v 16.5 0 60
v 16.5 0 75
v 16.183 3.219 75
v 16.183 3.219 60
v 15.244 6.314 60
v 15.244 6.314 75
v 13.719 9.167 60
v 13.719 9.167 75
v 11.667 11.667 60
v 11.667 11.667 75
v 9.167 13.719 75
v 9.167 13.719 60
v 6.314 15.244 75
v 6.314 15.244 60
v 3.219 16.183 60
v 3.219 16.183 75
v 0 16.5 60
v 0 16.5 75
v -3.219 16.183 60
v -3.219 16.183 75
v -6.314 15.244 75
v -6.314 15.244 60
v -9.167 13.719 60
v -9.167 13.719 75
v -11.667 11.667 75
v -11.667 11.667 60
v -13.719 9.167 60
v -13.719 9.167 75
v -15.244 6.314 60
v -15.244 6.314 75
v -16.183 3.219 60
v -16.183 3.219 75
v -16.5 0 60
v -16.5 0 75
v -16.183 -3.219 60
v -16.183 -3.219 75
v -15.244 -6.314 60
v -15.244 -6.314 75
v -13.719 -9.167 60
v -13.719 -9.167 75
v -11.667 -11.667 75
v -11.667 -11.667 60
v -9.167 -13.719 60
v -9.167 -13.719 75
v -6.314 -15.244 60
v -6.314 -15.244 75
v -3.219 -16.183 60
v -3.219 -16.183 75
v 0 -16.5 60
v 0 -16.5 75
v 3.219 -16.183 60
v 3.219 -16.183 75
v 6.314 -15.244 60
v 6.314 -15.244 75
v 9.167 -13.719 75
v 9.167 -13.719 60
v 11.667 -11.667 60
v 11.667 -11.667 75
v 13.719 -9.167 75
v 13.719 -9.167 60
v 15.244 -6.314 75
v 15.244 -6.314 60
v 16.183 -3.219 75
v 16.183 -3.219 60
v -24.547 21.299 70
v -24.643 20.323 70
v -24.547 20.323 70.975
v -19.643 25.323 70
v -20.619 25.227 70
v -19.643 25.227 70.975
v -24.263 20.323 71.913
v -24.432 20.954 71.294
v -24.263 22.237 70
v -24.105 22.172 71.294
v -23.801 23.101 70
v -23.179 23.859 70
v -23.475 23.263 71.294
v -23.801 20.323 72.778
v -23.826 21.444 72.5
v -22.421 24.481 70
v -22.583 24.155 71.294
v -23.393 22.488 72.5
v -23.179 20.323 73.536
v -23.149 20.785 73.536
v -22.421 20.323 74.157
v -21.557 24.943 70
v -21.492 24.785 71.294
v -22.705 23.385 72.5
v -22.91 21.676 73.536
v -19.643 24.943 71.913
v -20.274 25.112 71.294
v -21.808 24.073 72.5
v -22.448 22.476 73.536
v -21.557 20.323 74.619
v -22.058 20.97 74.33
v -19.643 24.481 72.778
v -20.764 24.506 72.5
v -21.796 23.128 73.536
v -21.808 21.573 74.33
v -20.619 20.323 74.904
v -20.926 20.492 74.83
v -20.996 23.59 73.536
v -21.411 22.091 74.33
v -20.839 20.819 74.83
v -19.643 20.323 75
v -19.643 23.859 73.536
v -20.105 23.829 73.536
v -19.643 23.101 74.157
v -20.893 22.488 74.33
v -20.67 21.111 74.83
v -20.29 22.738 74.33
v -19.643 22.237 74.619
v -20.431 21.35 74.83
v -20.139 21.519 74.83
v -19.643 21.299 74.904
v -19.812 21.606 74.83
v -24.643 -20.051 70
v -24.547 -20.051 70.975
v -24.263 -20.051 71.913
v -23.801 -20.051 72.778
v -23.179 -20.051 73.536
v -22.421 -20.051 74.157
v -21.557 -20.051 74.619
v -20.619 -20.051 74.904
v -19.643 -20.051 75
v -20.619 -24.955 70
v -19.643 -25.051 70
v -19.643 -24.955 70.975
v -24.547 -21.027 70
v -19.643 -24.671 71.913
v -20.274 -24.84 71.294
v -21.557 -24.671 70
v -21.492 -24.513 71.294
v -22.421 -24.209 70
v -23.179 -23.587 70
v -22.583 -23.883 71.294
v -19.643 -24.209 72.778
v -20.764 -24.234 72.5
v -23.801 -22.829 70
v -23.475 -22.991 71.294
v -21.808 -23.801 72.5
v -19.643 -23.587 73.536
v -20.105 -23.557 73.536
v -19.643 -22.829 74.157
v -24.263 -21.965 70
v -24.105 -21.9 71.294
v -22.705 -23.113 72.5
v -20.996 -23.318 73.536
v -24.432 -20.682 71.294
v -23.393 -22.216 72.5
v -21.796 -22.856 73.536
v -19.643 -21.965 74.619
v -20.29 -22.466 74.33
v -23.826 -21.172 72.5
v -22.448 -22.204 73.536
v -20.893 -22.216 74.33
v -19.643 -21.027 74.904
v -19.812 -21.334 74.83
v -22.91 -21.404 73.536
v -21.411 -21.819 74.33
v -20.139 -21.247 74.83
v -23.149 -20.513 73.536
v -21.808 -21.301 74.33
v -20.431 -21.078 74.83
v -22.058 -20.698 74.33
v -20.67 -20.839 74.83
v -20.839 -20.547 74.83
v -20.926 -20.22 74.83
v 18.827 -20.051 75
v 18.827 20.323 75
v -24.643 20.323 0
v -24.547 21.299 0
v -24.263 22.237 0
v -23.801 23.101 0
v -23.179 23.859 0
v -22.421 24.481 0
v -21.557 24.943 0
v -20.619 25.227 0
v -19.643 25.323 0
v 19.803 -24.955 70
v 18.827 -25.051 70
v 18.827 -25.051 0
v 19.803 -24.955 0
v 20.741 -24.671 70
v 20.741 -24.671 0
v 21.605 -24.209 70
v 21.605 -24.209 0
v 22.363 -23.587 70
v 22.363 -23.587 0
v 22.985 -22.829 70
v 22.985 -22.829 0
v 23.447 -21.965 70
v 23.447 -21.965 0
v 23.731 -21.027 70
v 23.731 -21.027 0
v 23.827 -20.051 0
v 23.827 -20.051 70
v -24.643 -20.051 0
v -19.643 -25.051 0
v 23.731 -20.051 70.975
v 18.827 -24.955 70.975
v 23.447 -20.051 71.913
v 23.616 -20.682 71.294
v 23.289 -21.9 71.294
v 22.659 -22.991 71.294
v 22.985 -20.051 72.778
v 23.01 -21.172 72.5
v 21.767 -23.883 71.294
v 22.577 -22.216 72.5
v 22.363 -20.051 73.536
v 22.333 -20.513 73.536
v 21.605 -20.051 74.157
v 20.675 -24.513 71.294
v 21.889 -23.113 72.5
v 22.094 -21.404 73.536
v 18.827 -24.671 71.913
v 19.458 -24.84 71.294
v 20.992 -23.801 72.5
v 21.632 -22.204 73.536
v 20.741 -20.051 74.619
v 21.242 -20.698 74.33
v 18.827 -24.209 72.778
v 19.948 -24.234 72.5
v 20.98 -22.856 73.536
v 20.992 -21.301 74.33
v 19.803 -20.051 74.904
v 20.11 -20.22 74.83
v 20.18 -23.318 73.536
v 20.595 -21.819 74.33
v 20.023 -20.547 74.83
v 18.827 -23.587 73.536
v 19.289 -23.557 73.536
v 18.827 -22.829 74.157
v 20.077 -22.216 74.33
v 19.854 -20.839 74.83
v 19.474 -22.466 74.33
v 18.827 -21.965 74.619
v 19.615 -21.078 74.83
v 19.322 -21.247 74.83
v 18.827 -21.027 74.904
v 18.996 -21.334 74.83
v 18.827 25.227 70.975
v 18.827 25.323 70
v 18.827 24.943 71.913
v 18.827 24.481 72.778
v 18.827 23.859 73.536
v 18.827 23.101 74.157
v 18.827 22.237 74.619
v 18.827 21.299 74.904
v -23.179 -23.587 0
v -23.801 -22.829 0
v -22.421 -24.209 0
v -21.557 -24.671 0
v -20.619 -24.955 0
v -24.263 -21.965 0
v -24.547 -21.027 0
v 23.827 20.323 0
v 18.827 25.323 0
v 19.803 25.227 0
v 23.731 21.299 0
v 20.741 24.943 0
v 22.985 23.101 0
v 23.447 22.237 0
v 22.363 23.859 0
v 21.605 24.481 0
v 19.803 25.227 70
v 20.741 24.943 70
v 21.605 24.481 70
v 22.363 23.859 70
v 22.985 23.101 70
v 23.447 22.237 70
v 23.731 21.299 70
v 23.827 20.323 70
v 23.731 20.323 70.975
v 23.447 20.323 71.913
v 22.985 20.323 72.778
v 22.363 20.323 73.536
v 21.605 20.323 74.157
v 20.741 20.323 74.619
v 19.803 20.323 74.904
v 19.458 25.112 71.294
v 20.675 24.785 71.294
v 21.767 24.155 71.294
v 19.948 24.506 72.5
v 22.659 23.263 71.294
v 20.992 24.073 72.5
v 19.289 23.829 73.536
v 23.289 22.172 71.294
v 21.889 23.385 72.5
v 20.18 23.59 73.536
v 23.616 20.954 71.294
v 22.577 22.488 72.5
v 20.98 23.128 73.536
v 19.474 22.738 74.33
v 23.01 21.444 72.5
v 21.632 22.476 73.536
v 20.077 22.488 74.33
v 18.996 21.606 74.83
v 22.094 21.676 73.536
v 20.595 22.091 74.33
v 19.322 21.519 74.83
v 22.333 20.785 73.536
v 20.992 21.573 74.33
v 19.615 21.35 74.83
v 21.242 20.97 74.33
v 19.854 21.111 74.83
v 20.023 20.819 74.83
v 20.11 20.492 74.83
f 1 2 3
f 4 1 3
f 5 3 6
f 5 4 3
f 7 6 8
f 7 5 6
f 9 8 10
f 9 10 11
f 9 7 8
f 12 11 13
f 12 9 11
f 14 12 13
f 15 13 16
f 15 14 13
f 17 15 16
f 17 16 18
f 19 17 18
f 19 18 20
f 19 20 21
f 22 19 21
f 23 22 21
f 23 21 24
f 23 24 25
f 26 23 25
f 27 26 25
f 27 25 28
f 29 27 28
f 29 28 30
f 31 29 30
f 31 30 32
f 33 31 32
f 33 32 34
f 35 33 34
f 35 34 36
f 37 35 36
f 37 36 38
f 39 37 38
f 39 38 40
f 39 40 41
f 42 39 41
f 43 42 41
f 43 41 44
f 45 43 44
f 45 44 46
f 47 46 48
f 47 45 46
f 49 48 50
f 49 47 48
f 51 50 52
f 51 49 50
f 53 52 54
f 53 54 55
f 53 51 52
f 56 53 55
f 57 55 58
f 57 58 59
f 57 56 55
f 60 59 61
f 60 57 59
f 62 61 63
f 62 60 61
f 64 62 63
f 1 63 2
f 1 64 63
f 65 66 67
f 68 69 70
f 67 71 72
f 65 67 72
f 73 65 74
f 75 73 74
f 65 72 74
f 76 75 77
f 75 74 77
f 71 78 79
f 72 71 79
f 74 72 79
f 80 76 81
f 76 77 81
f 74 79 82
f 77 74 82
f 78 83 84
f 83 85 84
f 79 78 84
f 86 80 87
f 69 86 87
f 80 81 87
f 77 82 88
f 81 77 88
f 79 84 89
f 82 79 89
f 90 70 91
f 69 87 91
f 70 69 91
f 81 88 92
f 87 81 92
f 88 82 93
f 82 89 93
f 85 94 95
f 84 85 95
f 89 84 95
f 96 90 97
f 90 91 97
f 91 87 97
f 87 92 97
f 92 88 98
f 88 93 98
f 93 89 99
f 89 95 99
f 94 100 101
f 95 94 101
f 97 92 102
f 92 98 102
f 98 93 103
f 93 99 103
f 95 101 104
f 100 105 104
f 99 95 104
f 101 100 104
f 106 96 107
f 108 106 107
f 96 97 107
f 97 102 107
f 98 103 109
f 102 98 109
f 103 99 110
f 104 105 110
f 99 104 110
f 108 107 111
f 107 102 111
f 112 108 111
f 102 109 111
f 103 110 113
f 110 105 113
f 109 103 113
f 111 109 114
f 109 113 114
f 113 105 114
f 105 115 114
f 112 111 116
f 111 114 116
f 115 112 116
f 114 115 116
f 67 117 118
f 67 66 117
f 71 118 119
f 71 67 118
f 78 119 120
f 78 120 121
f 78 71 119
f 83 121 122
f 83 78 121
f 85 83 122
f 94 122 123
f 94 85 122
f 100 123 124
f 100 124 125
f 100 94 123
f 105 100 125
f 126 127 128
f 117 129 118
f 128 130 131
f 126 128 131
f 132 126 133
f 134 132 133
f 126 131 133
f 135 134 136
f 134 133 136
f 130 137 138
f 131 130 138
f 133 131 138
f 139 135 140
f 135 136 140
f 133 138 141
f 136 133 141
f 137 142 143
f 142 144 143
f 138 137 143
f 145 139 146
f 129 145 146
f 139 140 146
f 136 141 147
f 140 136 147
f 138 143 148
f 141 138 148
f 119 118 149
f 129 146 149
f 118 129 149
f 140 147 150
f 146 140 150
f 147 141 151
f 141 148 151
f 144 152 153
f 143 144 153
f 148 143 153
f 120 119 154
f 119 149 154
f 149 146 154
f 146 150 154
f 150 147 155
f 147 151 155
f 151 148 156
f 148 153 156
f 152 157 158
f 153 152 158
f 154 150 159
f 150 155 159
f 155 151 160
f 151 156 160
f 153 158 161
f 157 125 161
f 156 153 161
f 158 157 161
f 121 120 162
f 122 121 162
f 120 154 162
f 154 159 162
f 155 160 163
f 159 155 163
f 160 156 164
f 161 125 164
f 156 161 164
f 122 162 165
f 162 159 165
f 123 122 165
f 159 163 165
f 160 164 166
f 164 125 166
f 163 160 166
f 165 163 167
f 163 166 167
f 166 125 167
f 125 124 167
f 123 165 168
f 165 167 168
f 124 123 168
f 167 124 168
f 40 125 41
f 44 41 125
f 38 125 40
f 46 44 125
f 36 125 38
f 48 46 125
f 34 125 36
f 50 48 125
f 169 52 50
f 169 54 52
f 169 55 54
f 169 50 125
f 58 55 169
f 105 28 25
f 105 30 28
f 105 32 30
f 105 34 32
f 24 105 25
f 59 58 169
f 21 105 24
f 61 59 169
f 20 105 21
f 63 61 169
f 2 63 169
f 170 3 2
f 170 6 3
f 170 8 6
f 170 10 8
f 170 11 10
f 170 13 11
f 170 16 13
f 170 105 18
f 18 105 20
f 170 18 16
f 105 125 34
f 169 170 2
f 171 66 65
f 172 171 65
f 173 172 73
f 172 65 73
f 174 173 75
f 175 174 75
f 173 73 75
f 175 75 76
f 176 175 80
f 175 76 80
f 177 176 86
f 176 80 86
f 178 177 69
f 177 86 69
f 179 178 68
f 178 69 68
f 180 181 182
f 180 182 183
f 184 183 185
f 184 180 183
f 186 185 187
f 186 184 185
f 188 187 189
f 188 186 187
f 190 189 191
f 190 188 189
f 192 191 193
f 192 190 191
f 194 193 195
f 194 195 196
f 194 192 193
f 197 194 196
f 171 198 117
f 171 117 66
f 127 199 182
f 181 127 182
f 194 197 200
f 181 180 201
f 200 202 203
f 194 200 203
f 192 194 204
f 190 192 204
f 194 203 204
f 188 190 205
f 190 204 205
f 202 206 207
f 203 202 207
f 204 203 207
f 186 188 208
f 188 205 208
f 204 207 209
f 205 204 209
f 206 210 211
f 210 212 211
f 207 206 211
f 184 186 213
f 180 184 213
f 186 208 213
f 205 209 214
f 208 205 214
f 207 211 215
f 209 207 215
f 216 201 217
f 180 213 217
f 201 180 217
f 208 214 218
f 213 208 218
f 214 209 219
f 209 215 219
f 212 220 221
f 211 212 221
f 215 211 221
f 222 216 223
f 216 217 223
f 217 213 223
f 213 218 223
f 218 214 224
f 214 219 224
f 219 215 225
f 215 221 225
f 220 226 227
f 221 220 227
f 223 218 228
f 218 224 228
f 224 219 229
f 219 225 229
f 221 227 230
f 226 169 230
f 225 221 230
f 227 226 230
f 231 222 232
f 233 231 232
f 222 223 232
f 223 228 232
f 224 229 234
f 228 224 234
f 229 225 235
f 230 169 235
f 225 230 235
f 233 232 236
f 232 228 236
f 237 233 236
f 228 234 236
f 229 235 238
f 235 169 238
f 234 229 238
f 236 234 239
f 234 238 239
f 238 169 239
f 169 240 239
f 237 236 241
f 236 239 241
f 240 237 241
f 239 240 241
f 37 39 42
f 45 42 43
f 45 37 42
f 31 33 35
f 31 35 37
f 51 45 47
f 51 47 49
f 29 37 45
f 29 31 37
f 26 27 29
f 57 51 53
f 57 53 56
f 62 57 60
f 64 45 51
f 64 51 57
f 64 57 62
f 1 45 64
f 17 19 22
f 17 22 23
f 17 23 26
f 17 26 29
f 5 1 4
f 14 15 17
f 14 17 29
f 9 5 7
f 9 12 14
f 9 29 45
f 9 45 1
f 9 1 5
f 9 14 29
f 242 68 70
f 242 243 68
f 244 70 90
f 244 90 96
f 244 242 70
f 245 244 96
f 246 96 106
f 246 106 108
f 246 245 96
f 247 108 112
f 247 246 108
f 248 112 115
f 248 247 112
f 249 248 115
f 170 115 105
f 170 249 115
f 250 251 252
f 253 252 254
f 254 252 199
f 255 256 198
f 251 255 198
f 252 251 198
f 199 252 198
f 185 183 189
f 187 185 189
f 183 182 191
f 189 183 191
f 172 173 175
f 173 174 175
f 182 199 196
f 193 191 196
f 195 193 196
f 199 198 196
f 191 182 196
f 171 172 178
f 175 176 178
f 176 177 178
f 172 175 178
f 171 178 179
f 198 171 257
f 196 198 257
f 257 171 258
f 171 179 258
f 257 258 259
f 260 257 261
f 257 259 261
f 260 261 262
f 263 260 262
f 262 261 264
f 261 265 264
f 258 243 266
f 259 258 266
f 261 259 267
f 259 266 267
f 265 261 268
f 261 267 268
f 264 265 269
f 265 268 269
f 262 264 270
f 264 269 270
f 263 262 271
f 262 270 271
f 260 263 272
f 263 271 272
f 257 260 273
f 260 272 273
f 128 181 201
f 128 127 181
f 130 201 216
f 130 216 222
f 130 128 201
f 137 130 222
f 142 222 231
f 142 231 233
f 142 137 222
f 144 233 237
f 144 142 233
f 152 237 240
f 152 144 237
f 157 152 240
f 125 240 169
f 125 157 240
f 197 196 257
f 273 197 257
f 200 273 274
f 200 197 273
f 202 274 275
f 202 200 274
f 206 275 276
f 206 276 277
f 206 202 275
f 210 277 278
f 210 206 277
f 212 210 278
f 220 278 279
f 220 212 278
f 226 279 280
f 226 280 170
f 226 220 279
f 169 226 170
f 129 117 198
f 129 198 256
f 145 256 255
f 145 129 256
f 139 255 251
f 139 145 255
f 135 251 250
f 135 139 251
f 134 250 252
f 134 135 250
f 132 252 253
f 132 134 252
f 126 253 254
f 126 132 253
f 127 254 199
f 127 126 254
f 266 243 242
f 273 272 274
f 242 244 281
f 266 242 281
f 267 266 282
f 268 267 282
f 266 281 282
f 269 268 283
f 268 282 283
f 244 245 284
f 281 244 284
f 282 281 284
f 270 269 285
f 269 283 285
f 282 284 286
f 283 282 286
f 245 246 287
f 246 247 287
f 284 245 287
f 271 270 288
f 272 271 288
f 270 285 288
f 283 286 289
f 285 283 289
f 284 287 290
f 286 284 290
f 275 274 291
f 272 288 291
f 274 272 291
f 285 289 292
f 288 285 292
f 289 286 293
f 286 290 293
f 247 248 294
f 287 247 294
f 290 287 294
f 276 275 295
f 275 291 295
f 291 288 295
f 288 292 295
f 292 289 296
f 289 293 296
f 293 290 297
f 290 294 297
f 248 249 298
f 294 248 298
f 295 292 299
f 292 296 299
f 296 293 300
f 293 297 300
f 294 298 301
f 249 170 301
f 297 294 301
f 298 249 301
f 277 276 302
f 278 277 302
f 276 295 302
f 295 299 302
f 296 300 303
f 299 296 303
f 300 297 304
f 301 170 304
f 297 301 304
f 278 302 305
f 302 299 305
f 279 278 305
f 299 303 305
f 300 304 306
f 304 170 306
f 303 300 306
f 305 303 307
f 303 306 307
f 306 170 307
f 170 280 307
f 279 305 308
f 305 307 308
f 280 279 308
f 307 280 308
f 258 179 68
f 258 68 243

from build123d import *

# Parameters (mm, degrees)
F0_W     = 48.470514
F0_H     = 50.374654
F0_R     = 16.5
F1_DEPTH = 75
F2_DEPTH = 60
F3_R     = 5
F4_R     = 5


with BuildPart() as f1:
    # F0 (on Top) → F1 (new body)
    with BuildSketch(Plane.XY):
        with Locations((-0.40803, 0.136011)):
            Rectangle(F0_W, F0_H)
        Circle(F0_R, mode=Mode.SUBTRACT)
    extrude(amount=F1_DEPTH)

    # F0 (on Top) → F2 (join)
    with BuildSketch(Plane.XY):
        Circle(F0_R)
    extrude(amount=F2_DEPTH)

    # F3
    f3_edges = [f1.edges().sort_by_distance(p)[0] for p in [
        (23.827227, 25.323338, 37.5),
        (-24.643287, 25.323338, 37.5),
        (23.827227, -25.051316, 37.5),
        (-24.643287, -25.051316, 37.5),
    ]]
    fillet(f3_edges, radius=F3_R)

    # F4
    f4_edges = [f1.edges().sort_by_distance(p)[0] for p in [
        (-0.40803, 25.323338, 75),
        (23.827227, 0.136011, 75),
        (-0.40803, -25.051316, 75),
        (-24.643287, 0.136011, 75),
    ]]
    fillet(f4_edges, radius=F4_R)


solid = f1.part
